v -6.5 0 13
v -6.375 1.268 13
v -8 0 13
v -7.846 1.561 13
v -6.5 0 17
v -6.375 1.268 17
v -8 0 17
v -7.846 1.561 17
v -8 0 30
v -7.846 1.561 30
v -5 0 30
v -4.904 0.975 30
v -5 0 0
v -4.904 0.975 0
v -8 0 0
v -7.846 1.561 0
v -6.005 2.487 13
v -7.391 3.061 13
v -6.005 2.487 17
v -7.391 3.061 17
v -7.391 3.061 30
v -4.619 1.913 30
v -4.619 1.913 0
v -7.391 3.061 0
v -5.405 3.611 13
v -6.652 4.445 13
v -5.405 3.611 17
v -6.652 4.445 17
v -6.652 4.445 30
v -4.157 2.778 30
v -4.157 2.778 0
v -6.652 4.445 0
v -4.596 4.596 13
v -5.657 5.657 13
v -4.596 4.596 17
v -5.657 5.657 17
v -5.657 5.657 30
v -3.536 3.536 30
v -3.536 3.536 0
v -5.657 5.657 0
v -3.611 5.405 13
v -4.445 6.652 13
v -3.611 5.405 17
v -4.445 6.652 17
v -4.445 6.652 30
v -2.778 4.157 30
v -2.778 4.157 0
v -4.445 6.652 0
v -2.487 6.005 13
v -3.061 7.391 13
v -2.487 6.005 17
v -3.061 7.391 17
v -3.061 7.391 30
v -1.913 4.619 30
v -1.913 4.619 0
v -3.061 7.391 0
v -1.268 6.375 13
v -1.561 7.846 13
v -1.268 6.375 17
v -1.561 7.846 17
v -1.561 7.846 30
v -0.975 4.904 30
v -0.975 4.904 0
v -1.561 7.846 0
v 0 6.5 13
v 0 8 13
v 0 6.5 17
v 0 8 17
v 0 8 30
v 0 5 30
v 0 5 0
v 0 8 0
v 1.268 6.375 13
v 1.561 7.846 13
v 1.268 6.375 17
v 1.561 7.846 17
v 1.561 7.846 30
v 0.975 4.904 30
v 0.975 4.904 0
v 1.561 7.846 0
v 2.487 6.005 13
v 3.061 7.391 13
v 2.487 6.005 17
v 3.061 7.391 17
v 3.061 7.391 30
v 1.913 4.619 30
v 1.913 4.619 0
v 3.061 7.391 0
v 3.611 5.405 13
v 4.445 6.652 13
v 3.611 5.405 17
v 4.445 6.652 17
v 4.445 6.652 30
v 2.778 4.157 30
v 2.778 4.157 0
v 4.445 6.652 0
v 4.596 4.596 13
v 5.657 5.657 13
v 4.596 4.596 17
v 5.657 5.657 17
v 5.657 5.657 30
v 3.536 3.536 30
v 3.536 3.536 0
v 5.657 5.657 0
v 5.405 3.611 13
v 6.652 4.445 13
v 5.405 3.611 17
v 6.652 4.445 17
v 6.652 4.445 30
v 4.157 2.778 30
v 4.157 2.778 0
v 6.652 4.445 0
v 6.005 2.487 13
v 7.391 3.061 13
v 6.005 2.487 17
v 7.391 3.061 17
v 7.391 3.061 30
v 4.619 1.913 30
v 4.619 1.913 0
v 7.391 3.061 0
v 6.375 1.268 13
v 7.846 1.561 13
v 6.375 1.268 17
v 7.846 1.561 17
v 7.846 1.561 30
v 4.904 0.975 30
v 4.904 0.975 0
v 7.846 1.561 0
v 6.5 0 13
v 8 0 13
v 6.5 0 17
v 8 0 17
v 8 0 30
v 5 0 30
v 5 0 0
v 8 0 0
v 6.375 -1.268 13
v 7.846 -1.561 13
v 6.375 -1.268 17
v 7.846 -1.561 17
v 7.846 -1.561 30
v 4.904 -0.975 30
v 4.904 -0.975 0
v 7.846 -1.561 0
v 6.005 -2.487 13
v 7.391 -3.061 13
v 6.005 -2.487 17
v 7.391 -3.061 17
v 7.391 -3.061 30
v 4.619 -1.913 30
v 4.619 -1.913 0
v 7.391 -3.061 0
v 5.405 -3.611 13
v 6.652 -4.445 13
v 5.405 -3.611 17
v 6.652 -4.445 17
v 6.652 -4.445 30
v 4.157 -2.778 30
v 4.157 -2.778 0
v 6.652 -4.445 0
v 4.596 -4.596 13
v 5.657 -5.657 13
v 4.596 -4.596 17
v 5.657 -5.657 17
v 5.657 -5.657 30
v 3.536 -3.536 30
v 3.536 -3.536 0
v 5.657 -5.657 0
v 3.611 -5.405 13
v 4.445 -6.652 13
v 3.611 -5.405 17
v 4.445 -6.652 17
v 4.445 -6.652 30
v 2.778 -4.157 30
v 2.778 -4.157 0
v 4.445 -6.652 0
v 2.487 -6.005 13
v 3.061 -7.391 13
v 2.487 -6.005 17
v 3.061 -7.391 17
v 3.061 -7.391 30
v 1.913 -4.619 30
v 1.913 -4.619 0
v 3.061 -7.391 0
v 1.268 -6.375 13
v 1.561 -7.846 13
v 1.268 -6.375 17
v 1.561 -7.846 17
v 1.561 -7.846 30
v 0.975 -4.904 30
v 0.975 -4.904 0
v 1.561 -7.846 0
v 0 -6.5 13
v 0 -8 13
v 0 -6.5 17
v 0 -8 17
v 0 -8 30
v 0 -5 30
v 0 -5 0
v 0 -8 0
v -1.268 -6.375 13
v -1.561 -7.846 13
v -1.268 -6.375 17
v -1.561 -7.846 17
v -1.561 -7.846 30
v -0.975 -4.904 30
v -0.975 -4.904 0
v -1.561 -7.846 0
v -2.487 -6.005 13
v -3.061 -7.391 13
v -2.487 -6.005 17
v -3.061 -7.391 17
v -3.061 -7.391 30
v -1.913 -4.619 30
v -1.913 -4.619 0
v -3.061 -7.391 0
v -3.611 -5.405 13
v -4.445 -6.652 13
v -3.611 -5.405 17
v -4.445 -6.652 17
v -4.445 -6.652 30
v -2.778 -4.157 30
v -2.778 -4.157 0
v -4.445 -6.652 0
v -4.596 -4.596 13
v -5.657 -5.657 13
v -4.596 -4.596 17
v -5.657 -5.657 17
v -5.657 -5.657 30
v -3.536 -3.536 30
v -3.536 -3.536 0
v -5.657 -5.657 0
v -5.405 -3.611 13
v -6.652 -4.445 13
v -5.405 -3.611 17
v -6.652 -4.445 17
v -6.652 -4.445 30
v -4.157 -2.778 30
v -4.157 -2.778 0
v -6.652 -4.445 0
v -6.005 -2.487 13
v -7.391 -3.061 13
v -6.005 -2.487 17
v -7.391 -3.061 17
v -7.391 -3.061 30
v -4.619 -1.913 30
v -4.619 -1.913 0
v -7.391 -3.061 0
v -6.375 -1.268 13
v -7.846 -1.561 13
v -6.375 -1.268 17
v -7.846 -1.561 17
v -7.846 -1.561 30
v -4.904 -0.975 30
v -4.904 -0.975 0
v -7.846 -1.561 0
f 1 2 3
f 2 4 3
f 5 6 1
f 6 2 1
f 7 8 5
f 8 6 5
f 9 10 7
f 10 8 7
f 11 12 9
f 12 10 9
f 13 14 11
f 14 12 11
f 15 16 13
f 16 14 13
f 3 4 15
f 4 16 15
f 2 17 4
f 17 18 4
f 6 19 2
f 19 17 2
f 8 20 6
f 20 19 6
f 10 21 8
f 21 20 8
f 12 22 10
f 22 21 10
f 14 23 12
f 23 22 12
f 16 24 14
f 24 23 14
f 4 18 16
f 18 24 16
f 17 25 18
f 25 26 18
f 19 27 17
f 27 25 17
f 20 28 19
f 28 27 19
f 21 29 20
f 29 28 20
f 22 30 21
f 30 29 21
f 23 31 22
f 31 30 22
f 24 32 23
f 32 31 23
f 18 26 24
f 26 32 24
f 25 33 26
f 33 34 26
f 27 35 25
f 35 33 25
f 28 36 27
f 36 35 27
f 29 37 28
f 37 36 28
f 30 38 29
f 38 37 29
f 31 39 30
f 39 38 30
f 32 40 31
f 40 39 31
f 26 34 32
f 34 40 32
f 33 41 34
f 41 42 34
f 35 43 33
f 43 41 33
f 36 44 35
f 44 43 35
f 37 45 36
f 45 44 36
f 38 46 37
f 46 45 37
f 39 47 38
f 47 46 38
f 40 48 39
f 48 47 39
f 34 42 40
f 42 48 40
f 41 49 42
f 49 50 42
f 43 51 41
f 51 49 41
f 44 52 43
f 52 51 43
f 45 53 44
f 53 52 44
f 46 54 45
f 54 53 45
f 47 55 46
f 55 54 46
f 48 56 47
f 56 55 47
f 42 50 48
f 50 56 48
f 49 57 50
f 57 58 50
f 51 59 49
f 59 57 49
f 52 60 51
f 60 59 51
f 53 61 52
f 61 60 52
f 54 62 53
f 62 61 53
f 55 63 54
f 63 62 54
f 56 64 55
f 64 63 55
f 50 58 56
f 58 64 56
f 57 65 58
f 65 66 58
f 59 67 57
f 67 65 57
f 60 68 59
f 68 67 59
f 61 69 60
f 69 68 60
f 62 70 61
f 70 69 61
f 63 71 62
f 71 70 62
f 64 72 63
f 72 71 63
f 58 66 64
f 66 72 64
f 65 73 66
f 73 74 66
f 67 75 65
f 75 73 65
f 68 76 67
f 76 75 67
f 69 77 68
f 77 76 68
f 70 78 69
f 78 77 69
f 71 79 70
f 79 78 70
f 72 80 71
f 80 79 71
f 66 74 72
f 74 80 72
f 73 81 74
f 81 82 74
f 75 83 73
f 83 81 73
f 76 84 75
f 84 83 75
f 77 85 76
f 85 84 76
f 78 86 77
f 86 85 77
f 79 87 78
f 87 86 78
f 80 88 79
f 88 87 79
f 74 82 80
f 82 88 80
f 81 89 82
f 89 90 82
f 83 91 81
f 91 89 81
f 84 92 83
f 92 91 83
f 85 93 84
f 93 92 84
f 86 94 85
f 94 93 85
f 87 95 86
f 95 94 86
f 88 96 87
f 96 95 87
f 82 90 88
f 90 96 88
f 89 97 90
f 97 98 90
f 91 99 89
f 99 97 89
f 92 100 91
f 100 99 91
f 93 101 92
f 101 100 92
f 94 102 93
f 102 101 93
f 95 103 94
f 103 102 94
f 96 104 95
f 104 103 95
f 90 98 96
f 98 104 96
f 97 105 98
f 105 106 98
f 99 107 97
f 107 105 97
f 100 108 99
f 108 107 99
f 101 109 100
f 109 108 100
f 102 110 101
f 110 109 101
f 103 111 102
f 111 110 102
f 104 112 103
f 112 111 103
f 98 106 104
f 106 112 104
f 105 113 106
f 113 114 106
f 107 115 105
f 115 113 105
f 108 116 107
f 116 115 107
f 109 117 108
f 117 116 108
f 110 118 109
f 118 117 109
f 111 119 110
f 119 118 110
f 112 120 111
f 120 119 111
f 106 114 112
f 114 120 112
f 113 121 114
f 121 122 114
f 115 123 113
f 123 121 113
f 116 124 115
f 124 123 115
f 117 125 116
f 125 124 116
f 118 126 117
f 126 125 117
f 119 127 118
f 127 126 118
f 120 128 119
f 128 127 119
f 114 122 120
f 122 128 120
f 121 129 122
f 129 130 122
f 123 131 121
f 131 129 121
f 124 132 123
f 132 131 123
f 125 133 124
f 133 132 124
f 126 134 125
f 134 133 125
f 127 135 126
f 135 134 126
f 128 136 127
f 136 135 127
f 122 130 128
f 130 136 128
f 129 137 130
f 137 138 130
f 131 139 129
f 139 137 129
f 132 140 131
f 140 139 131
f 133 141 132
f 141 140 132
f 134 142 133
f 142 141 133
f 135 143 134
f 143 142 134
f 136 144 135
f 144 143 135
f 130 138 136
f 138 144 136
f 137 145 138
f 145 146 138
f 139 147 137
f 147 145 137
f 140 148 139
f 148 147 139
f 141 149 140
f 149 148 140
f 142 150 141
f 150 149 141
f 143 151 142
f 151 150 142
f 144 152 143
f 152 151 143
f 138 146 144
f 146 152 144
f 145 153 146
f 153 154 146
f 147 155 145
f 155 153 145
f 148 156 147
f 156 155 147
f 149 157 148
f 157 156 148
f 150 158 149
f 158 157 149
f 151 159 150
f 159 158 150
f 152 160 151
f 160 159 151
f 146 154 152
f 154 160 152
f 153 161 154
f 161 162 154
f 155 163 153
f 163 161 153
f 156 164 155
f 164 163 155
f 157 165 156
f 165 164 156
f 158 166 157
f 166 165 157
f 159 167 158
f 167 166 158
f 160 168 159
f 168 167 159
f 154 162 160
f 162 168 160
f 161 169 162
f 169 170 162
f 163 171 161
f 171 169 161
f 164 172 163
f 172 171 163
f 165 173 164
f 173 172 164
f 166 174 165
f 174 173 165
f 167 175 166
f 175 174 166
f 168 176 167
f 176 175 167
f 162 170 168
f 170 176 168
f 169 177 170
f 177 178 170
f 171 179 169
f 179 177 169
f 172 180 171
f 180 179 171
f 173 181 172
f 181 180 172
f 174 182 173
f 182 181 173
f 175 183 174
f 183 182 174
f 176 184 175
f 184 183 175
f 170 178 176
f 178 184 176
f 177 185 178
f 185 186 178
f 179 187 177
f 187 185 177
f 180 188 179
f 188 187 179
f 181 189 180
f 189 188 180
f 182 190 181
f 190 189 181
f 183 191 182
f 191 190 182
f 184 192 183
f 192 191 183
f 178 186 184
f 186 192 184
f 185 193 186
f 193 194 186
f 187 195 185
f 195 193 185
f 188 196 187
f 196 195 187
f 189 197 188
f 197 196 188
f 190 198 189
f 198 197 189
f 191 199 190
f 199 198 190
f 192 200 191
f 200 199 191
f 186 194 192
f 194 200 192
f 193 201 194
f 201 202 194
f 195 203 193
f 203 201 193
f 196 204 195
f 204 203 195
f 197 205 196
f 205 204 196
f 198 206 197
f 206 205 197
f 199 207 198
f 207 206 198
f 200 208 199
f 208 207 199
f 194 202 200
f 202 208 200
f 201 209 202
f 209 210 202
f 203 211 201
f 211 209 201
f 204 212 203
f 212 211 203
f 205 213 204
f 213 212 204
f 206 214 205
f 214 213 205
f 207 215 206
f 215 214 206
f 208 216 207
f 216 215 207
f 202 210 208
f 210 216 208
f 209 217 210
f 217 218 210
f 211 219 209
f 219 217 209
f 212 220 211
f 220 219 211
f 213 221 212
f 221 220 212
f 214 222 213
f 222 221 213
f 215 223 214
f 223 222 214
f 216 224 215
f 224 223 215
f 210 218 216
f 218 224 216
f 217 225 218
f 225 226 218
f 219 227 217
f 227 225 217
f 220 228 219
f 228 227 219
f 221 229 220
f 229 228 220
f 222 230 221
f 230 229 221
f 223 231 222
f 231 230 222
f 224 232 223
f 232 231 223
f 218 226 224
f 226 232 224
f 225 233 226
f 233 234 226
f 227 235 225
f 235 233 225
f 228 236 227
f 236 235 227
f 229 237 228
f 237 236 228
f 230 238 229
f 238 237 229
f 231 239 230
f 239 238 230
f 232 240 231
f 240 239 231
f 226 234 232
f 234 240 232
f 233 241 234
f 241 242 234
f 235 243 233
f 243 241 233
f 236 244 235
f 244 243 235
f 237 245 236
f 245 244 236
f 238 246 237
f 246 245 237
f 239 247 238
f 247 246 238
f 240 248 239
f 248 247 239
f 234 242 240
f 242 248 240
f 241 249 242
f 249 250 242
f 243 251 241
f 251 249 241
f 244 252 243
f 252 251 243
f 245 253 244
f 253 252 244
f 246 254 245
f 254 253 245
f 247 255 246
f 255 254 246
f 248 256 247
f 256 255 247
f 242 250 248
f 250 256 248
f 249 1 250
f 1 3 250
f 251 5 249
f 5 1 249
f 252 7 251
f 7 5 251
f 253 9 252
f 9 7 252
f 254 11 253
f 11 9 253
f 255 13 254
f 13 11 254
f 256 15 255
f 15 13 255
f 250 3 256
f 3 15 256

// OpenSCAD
$fn = 32;

// ----------------------------------------------------------------------
// Grooved revolve: stepped, bore R5
// ----------------------------------------------------------------------

// --- parameters (mm) ---
bore_r = 5;               // bore radius
outer_r = 8;              // outer radius of the body
total_h = 30;             // overall height, Z
wall = 3;                 // radial wall thickness
groove_w = 4;             // groove width
groove_d = 1.5;           // groove depth
grooves = 1;              // number of outer grooves

bbox_x = 2 * outer_r;  // full diameter
bore_d = 2 * bore_r;  // bore diameter
body_d = 2 * outer_r;  // body diameter
revolve_angle = 360;  // full turn around the Z axis

profile = [[5, 0], [8, 0], [8, 13], [6.5, 13], [6.5, 17], [8, 17], [8, 30], [5, 30]];  // primary outline, 8 points, counter clockwise

// --- the one profile operation ---
rotate_extrude(angle = revolve_angle) polygon(points = profile);
